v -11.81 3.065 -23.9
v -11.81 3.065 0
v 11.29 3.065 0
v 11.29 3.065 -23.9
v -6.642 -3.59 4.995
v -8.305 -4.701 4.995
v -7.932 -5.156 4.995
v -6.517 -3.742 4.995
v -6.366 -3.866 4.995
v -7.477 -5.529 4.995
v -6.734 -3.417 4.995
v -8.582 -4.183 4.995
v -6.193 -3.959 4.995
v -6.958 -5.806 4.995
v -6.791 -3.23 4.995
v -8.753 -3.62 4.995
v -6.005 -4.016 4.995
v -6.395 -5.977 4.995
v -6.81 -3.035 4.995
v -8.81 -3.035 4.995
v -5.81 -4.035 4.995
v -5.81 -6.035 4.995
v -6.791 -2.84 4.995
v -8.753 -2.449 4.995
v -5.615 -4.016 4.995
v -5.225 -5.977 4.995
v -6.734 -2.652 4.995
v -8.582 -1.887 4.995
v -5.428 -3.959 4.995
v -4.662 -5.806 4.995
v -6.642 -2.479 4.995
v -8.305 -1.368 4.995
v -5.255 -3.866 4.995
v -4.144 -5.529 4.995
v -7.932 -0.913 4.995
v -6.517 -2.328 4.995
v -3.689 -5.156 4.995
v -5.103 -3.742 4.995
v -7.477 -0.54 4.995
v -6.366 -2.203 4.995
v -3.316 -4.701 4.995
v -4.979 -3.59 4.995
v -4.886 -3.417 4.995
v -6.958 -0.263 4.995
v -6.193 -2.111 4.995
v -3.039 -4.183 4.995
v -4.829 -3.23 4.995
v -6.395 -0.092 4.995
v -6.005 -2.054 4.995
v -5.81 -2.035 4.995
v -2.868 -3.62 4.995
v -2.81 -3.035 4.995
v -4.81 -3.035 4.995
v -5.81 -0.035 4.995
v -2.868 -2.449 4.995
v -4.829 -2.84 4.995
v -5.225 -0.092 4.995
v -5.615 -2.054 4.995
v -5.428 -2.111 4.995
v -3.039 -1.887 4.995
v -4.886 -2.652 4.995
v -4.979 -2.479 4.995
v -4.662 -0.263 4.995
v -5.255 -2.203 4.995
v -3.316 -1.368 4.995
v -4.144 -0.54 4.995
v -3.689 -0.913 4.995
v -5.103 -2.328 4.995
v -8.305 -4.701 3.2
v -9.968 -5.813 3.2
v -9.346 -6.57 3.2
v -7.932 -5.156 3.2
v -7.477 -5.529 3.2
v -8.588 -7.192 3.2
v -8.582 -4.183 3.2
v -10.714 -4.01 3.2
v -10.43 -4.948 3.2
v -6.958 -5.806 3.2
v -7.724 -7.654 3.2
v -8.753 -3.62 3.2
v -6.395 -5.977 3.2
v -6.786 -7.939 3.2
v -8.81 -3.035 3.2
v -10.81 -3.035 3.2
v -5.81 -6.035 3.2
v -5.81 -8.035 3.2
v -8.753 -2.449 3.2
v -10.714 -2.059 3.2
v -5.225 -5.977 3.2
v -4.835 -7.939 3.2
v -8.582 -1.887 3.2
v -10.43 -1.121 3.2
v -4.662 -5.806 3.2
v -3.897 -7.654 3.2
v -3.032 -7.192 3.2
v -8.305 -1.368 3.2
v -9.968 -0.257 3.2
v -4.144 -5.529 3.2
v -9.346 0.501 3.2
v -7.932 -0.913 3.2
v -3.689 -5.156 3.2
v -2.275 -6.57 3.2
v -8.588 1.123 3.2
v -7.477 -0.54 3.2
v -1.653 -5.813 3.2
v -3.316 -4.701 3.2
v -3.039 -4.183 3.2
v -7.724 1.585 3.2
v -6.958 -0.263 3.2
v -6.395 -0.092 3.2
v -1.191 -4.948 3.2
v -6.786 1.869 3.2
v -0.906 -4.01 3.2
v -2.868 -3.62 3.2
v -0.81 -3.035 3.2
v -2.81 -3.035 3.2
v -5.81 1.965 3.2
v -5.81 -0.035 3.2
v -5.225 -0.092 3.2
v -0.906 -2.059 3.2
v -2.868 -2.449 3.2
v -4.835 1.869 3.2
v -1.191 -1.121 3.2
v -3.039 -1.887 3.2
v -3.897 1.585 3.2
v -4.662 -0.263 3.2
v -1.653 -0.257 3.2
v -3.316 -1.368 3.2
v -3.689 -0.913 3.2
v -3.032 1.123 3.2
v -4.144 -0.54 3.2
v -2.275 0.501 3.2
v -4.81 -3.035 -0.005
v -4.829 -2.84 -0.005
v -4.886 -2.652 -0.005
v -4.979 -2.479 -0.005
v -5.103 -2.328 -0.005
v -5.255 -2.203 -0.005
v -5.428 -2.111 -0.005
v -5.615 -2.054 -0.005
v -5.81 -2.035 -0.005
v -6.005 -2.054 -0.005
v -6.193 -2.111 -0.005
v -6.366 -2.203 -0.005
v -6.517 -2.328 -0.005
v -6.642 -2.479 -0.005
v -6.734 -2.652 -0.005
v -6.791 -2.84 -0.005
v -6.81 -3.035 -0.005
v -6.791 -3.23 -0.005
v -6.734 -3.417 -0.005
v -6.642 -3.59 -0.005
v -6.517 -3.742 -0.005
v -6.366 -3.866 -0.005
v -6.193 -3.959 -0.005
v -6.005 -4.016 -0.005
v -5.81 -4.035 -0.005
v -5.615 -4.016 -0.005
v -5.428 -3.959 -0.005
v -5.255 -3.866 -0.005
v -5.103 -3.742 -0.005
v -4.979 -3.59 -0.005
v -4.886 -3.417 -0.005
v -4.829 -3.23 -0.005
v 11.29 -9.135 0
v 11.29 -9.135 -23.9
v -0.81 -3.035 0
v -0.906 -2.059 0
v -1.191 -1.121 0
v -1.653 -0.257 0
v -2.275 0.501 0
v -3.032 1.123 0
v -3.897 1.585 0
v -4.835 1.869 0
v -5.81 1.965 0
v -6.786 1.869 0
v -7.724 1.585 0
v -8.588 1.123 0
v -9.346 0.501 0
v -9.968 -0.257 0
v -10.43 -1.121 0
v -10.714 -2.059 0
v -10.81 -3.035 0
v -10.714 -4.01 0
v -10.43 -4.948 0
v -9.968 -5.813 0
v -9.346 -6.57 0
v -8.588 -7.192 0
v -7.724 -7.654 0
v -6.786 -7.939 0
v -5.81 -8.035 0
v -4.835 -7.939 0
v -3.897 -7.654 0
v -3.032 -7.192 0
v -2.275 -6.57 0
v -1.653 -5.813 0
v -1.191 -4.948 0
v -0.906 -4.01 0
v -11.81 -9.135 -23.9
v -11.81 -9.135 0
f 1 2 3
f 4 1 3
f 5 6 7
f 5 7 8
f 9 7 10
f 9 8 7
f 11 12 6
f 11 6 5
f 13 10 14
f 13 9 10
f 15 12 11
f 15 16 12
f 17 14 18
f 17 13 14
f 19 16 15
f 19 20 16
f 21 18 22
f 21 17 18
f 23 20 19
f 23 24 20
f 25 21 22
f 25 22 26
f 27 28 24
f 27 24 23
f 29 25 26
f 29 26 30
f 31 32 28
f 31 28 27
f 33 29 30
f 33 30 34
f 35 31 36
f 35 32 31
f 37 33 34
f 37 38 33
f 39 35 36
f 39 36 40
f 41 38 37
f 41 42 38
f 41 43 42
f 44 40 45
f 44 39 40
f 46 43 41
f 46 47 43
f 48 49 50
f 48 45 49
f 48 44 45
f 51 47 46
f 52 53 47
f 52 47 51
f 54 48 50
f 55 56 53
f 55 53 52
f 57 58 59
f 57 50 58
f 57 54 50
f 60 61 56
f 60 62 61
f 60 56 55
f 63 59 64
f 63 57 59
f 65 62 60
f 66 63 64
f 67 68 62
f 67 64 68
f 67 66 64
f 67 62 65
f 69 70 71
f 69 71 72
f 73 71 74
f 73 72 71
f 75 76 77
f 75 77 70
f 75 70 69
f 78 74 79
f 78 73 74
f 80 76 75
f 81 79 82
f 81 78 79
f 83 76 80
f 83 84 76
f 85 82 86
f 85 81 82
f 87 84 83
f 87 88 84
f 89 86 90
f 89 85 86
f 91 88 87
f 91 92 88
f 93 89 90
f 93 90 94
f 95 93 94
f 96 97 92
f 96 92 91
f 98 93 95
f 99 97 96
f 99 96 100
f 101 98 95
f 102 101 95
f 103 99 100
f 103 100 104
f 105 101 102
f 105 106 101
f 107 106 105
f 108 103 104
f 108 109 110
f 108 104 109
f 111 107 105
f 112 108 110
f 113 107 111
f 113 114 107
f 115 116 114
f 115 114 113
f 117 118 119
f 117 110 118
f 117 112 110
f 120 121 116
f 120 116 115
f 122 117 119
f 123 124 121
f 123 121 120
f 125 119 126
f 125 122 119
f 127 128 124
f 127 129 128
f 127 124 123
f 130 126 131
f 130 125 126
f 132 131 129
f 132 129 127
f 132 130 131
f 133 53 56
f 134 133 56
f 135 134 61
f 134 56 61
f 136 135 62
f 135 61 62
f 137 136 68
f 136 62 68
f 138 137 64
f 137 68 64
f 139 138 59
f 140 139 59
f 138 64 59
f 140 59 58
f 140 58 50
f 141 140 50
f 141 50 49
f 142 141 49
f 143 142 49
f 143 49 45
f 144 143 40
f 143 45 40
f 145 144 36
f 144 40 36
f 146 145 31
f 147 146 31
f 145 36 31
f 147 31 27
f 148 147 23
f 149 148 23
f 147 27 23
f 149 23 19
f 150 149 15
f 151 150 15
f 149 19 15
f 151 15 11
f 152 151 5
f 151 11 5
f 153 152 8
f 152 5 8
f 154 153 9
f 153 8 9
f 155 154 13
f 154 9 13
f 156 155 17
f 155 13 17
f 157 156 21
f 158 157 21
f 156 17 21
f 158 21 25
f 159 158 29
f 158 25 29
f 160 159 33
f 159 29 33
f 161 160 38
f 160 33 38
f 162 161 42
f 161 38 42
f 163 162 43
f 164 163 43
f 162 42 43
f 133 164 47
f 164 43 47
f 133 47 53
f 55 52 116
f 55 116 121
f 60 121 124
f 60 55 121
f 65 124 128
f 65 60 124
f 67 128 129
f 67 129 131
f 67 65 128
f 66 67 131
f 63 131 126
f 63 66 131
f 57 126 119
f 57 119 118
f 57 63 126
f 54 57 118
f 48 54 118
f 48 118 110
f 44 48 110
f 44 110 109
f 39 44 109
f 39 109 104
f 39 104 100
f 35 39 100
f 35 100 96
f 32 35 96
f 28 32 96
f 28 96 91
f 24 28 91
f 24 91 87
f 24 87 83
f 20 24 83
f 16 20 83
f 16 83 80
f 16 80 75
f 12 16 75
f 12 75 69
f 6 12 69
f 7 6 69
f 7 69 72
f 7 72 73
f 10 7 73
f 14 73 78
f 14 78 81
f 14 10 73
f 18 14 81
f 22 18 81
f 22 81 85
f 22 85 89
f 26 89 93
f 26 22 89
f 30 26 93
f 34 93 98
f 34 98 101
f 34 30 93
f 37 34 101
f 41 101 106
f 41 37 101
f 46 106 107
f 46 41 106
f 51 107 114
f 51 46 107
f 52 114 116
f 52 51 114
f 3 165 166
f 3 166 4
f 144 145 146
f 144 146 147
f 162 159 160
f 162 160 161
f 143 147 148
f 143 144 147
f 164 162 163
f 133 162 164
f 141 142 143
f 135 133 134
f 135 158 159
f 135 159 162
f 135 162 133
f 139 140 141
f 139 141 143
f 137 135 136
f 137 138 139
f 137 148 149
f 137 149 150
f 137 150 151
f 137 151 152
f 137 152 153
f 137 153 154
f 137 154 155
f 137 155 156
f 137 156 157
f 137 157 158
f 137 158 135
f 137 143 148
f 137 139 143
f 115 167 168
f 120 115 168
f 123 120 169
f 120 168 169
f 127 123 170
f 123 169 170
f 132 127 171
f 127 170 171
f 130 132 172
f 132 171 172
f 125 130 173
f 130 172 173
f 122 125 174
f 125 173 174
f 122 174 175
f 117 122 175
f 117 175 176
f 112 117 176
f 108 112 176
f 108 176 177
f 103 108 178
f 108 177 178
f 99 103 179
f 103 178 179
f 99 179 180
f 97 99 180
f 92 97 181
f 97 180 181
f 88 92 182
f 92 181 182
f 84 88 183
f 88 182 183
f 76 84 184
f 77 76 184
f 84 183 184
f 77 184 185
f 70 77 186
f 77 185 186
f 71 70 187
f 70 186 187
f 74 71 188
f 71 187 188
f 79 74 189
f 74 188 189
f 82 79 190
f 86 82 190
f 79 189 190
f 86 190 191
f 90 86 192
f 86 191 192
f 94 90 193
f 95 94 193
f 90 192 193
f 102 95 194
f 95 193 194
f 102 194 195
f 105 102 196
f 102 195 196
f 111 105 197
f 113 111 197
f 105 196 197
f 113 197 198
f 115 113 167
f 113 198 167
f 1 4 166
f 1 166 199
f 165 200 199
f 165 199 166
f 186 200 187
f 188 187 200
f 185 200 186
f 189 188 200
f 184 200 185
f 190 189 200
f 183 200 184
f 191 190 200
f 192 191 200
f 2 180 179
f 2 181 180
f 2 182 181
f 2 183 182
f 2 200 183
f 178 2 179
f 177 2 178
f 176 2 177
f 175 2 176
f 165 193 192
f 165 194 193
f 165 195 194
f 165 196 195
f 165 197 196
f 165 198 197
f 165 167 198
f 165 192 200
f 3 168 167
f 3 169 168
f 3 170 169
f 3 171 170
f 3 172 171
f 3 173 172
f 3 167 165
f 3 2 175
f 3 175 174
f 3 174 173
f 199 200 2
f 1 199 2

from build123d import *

# Parameters (mm, degrees)
SKETCH_1_W          = 23.1
SKETCH_1_H          = 12.2
EXTRUDE_1_DEPTH     = 27.1
SKETCH_2_R          = 5
EXTRUDE_2_DEPTH     = 3.2
SKETCH_3_W          = 23.1
SKETCH_3_H          = 12.2
CUT_EXTRUDE_1_DEPTH = 3.2
SKETCH_4_R          = 3
CUT_EXTRUDE_2_DEPTH = 3.2
EXTRUDE_START       = 4.995444433
SKETCH_5_R          = 3
EXTRUDE_3_DEPTH     = 4.995444433
SKETCH_7_R          = 1
CUT_EXTRUDE_3_DEPTH = 5


with BuildPart() as part:
    # 草图1 → 凸台-拉伸1 (new body)
    with BuildSketch(Plane.XY):
        with Locations((-0.26021144, -3.034725608)):
            Rectangle(SKETCH_1_W, SKETCH_1_H)
    extrude(amount=-EXTRUDE_1_DEPTH)

    # 草图2 → 凸台-拉伸2 (add)
    with BuildSketch(Plane.XY):
        with Locations((-5.81021144, -3.034725608)):
            Circle(SKETCH_2_R)
    extrude(amount=EXTRUDE_2_DEPTH)

    # 草图3 → 切除-拉伸1 (cut)
    with BuildSketch(Plane(origin=(0, 0, -27.1), x_dir=(-1, 0, 0), z_dir=(0, 0, -1))):
        with Locations((0.26021144, -3.034725608)):
            Rectangle(SKETCH_3_W, SKETCH_3_H)
    extrude(amount=-CUT_EXTRUDE_1_DEPTH, mode=Mode.SUBTRACT)

    # 草图4 → 切除-拉伸2 (cut)
    with BuildSketch(Plane.XY.offset(3.2)):
        with Locations((-5.81021144, -3.034725608)):
            Circle(SKETCH_4_R)
    extrude(amount=-CUT_EXTRUDE_2_DEPTH, mode=Mode.SUBTRACT)

    # 草图5 → 凸台-拉伸3 (add)
    with BuildSketch(Plane.XY.offset(EXTRUDE_START)):
        with Locations((-5.81021144, -3.034725608)):
            Circle(SKETCH_5_R)
    extrude(amount=-EXTRUDE_3_DEPTH)

    # 草图7 → 切除-拉伸3 (cut)
    with BuildSketch(Plane.XY.offset(4.995444433)):
        with Locations((-5.81021144, -3.034725608)):
            Circle(SKETCH_7_R)
    extrude(amount=-CUT_EXTRUDE_3_DEPTH, mode=Mode.SUBTRACT)


solid = part.part
